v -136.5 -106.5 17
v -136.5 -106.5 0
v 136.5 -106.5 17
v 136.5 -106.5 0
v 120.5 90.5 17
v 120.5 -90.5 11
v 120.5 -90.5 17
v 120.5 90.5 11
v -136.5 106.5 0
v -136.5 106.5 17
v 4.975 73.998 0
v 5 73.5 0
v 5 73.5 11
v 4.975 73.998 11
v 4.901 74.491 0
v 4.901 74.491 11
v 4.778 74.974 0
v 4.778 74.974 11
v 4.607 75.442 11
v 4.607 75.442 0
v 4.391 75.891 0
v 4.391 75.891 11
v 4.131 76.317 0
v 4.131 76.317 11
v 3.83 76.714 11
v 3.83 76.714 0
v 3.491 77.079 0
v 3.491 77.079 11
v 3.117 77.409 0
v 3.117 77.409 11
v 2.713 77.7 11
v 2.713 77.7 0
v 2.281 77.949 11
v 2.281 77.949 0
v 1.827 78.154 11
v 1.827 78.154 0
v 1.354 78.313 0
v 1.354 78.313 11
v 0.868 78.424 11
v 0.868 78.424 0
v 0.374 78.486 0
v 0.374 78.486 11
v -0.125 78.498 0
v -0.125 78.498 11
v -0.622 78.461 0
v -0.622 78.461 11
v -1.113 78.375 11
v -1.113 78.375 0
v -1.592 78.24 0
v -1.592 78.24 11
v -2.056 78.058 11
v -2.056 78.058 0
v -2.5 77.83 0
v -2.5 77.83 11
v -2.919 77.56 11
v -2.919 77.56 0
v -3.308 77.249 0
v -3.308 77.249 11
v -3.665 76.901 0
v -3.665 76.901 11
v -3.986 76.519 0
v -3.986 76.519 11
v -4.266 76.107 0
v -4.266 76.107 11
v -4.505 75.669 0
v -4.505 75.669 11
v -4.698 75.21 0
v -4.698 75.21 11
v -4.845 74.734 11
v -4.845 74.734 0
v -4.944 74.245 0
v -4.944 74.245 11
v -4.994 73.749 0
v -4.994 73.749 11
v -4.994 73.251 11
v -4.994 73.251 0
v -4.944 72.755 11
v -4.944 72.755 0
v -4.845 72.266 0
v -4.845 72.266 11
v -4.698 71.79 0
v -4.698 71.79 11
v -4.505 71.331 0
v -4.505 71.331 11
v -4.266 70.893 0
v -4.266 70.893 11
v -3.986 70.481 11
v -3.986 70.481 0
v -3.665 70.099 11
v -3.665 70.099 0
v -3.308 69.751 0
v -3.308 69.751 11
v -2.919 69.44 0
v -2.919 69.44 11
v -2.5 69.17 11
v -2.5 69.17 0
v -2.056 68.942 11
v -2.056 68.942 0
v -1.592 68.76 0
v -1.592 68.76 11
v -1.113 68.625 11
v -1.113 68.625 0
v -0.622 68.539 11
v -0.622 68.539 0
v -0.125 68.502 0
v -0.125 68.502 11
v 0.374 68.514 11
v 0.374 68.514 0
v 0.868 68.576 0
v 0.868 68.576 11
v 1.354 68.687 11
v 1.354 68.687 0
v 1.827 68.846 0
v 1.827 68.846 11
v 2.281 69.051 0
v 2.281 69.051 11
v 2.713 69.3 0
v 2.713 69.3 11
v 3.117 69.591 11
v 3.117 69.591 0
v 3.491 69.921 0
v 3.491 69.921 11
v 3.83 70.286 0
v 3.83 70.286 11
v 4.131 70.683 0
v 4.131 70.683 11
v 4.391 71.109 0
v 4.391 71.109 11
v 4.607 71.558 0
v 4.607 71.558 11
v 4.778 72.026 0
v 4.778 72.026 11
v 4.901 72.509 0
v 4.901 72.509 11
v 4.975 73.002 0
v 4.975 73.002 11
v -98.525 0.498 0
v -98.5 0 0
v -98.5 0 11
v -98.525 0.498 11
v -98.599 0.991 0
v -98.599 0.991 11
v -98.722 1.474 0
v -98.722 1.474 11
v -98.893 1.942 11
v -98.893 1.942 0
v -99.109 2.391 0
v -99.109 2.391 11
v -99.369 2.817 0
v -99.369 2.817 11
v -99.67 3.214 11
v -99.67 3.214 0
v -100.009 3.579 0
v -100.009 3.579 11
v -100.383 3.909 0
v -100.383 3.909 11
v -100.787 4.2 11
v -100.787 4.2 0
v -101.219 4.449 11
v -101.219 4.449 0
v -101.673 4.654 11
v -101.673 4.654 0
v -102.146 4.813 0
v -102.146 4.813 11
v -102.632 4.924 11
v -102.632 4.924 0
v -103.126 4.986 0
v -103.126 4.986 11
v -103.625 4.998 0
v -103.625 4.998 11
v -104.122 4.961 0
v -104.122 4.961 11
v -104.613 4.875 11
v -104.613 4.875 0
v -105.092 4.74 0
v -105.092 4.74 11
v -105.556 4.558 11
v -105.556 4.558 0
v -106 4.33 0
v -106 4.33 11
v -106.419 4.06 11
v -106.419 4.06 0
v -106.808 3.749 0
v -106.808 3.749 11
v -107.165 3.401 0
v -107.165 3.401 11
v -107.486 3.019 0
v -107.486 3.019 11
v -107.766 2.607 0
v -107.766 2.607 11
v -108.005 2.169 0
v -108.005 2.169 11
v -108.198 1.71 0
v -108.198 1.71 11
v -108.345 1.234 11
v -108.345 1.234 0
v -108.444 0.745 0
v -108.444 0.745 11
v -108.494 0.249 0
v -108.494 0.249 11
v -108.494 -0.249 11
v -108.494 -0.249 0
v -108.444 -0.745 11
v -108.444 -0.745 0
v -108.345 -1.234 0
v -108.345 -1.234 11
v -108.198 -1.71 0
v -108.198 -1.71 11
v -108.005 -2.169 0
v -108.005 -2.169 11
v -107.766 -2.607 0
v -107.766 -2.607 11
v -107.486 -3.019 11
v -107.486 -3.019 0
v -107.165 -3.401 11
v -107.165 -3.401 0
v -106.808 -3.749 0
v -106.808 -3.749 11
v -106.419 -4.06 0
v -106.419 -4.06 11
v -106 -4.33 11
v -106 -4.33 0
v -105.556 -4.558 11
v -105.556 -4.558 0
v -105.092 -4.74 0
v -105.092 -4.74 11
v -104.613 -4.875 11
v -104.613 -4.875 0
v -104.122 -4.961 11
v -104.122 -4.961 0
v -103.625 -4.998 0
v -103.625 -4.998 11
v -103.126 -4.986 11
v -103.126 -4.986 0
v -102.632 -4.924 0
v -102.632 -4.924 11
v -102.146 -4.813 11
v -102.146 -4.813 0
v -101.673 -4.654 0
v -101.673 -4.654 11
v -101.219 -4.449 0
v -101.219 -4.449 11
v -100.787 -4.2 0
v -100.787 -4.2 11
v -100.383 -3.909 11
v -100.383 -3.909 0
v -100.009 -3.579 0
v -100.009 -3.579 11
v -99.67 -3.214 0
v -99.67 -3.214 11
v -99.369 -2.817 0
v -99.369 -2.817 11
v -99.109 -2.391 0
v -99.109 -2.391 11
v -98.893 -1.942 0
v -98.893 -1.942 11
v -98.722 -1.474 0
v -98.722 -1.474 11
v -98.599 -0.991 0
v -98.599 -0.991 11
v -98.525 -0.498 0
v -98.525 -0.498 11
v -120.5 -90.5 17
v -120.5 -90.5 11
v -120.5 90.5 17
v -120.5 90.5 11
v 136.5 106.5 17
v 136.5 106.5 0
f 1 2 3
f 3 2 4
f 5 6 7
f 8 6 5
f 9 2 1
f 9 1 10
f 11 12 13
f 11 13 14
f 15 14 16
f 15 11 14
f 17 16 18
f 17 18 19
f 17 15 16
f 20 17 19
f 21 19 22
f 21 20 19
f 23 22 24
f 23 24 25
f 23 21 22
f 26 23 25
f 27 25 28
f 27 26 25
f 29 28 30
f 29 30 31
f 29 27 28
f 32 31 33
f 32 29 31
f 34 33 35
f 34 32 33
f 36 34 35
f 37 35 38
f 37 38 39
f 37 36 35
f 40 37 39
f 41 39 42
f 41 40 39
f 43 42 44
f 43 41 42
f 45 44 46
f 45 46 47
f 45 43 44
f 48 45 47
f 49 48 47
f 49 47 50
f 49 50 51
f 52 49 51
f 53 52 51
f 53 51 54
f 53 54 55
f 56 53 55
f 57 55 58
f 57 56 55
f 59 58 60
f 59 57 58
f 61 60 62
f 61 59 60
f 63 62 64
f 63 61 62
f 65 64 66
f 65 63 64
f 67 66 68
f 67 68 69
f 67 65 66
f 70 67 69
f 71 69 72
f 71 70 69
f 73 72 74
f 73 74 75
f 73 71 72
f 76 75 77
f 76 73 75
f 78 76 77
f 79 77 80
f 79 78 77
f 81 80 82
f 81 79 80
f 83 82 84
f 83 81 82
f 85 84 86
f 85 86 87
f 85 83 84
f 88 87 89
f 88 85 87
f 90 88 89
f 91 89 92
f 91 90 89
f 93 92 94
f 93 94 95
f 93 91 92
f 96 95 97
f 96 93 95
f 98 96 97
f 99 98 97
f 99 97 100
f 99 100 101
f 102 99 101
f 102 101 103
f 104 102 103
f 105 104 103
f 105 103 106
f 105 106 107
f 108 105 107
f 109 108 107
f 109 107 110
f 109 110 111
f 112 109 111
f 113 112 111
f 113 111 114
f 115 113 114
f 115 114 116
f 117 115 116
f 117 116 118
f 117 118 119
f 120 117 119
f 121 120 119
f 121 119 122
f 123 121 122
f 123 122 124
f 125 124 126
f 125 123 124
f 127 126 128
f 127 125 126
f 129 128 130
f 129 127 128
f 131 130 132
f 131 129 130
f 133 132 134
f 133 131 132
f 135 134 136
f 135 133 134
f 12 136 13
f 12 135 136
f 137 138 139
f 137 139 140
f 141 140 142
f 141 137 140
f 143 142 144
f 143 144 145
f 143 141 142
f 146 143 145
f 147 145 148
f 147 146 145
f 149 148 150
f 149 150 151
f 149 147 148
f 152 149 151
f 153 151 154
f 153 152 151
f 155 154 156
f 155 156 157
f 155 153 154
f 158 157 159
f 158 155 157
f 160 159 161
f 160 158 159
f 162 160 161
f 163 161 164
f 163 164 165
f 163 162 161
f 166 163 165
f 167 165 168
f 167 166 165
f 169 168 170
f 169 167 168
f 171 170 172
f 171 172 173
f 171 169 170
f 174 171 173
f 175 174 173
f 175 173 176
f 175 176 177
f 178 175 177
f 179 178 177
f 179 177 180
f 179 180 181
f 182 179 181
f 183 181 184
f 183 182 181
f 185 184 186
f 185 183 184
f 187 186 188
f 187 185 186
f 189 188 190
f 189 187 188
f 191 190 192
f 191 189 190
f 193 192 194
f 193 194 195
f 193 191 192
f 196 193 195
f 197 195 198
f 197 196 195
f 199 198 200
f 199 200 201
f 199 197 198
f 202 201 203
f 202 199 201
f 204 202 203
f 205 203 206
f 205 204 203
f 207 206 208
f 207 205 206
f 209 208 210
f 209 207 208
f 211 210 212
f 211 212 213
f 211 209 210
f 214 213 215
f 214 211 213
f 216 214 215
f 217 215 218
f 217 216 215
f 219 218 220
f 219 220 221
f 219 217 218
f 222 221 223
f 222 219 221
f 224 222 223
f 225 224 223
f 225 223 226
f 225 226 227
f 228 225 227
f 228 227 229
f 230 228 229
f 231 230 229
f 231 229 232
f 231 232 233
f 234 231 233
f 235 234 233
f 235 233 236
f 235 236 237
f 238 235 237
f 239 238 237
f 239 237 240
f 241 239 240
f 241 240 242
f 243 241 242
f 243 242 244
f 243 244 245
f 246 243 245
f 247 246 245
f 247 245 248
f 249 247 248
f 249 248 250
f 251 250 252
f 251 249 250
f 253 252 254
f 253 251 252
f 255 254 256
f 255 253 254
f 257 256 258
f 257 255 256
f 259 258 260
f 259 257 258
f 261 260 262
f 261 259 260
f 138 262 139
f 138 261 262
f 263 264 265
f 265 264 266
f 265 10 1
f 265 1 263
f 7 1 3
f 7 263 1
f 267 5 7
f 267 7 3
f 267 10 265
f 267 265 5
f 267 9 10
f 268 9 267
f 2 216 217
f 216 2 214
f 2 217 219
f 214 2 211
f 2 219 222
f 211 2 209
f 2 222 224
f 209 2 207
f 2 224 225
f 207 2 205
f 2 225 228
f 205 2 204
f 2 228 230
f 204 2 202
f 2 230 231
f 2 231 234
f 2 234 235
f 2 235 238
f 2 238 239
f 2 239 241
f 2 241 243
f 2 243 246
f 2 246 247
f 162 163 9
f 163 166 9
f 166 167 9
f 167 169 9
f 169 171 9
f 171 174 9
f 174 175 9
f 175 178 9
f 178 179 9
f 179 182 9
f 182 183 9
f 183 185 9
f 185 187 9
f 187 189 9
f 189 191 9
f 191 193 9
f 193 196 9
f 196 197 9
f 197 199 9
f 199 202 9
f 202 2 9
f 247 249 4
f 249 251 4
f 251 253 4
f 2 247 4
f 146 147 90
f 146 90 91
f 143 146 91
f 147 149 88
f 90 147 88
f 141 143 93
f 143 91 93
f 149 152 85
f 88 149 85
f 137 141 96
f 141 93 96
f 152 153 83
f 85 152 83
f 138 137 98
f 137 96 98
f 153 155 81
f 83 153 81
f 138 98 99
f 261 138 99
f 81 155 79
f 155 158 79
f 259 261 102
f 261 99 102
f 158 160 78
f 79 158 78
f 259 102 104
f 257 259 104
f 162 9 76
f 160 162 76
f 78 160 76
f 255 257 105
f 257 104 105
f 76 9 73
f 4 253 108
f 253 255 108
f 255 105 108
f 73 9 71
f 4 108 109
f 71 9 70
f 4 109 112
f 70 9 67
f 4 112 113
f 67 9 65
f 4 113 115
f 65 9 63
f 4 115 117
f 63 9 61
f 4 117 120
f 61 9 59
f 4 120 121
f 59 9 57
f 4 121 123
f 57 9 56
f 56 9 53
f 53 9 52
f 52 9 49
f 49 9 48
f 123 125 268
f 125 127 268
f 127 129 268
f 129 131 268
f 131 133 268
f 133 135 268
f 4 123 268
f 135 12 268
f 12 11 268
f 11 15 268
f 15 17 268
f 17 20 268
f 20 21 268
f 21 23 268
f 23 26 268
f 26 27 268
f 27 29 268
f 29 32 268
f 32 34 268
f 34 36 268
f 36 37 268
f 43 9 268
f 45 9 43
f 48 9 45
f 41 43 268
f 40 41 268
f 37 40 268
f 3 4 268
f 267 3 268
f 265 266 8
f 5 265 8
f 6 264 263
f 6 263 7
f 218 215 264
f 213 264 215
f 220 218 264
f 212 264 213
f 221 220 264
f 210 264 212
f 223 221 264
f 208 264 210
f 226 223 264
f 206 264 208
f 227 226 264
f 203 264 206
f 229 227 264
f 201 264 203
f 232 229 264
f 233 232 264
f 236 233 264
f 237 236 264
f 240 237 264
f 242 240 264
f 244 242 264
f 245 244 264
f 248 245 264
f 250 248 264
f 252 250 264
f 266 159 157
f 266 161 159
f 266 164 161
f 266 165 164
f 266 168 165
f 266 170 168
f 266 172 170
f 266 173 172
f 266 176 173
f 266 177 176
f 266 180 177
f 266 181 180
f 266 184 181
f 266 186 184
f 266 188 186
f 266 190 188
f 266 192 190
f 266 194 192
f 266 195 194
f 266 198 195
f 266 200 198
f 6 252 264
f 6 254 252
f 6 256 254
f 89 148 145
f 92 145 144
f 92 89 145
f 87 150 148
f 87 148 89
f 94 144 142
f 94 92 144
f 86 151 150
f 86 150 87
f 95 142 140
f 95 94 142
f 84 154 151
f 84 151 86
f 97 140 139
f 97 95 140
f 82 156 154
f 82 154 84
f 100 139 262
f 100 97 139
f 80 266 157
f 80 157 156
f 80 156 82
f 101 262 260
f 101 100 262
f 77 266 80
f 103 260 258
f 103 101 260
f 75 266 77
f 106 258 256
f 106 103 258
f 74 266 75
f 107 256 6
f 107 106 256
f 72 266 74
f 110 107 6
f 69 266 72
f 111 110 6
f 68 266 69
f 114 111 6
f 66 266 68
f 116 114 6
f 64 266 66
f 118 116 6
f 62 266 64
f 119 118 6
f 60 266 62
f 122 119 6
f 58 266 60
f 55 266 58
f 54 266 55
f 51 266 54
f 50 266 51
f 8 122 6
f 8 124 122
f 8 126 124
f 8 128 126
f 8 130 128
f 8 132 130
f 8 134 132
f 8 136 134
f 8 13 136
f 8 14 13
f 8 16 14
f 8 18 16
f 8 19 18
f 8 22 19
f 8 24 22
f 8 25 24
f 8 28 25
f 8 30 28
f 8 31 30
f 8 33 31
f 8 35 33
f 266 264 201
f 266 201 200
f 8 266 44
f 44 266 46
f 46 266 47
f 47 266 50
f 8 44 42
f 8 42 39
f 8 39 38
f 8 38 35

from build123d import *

# Parameters (mm, degrees)
F0_W     = 273
F0_H     = 213
F0_W_2   = 241
F0_H_2   = 181
F1_DEPTH = 17
F0_R     = 5
F2_DEPTH = 11


with BuildPart() as f1:
    # F0 (on Top) → F1 (new body)
    with BuildSketch(Plane.XY):
        Rectangle(F0_W, F0_H)
        Rectangle(F0_W_2, F0_H_2, mode=Mode.SUBTRACT)
    extrude(amount=F1_DEPTH)

    # F0 (on Top) → F2 (join)
    with BuildSketch(Plane.XY):
        Rectangle(F0_W_2, F0_H_2)
        with Locations((-103.5, 0)):
            Circle(F0_R, mode=Mode.SUBTRACT)
        with Locations((0, 73.5)):
            Circle(F0_R, mode=Mode.SUBTRACT)
    extrude(amount=F2_DEPTH)


solid = f1.part
